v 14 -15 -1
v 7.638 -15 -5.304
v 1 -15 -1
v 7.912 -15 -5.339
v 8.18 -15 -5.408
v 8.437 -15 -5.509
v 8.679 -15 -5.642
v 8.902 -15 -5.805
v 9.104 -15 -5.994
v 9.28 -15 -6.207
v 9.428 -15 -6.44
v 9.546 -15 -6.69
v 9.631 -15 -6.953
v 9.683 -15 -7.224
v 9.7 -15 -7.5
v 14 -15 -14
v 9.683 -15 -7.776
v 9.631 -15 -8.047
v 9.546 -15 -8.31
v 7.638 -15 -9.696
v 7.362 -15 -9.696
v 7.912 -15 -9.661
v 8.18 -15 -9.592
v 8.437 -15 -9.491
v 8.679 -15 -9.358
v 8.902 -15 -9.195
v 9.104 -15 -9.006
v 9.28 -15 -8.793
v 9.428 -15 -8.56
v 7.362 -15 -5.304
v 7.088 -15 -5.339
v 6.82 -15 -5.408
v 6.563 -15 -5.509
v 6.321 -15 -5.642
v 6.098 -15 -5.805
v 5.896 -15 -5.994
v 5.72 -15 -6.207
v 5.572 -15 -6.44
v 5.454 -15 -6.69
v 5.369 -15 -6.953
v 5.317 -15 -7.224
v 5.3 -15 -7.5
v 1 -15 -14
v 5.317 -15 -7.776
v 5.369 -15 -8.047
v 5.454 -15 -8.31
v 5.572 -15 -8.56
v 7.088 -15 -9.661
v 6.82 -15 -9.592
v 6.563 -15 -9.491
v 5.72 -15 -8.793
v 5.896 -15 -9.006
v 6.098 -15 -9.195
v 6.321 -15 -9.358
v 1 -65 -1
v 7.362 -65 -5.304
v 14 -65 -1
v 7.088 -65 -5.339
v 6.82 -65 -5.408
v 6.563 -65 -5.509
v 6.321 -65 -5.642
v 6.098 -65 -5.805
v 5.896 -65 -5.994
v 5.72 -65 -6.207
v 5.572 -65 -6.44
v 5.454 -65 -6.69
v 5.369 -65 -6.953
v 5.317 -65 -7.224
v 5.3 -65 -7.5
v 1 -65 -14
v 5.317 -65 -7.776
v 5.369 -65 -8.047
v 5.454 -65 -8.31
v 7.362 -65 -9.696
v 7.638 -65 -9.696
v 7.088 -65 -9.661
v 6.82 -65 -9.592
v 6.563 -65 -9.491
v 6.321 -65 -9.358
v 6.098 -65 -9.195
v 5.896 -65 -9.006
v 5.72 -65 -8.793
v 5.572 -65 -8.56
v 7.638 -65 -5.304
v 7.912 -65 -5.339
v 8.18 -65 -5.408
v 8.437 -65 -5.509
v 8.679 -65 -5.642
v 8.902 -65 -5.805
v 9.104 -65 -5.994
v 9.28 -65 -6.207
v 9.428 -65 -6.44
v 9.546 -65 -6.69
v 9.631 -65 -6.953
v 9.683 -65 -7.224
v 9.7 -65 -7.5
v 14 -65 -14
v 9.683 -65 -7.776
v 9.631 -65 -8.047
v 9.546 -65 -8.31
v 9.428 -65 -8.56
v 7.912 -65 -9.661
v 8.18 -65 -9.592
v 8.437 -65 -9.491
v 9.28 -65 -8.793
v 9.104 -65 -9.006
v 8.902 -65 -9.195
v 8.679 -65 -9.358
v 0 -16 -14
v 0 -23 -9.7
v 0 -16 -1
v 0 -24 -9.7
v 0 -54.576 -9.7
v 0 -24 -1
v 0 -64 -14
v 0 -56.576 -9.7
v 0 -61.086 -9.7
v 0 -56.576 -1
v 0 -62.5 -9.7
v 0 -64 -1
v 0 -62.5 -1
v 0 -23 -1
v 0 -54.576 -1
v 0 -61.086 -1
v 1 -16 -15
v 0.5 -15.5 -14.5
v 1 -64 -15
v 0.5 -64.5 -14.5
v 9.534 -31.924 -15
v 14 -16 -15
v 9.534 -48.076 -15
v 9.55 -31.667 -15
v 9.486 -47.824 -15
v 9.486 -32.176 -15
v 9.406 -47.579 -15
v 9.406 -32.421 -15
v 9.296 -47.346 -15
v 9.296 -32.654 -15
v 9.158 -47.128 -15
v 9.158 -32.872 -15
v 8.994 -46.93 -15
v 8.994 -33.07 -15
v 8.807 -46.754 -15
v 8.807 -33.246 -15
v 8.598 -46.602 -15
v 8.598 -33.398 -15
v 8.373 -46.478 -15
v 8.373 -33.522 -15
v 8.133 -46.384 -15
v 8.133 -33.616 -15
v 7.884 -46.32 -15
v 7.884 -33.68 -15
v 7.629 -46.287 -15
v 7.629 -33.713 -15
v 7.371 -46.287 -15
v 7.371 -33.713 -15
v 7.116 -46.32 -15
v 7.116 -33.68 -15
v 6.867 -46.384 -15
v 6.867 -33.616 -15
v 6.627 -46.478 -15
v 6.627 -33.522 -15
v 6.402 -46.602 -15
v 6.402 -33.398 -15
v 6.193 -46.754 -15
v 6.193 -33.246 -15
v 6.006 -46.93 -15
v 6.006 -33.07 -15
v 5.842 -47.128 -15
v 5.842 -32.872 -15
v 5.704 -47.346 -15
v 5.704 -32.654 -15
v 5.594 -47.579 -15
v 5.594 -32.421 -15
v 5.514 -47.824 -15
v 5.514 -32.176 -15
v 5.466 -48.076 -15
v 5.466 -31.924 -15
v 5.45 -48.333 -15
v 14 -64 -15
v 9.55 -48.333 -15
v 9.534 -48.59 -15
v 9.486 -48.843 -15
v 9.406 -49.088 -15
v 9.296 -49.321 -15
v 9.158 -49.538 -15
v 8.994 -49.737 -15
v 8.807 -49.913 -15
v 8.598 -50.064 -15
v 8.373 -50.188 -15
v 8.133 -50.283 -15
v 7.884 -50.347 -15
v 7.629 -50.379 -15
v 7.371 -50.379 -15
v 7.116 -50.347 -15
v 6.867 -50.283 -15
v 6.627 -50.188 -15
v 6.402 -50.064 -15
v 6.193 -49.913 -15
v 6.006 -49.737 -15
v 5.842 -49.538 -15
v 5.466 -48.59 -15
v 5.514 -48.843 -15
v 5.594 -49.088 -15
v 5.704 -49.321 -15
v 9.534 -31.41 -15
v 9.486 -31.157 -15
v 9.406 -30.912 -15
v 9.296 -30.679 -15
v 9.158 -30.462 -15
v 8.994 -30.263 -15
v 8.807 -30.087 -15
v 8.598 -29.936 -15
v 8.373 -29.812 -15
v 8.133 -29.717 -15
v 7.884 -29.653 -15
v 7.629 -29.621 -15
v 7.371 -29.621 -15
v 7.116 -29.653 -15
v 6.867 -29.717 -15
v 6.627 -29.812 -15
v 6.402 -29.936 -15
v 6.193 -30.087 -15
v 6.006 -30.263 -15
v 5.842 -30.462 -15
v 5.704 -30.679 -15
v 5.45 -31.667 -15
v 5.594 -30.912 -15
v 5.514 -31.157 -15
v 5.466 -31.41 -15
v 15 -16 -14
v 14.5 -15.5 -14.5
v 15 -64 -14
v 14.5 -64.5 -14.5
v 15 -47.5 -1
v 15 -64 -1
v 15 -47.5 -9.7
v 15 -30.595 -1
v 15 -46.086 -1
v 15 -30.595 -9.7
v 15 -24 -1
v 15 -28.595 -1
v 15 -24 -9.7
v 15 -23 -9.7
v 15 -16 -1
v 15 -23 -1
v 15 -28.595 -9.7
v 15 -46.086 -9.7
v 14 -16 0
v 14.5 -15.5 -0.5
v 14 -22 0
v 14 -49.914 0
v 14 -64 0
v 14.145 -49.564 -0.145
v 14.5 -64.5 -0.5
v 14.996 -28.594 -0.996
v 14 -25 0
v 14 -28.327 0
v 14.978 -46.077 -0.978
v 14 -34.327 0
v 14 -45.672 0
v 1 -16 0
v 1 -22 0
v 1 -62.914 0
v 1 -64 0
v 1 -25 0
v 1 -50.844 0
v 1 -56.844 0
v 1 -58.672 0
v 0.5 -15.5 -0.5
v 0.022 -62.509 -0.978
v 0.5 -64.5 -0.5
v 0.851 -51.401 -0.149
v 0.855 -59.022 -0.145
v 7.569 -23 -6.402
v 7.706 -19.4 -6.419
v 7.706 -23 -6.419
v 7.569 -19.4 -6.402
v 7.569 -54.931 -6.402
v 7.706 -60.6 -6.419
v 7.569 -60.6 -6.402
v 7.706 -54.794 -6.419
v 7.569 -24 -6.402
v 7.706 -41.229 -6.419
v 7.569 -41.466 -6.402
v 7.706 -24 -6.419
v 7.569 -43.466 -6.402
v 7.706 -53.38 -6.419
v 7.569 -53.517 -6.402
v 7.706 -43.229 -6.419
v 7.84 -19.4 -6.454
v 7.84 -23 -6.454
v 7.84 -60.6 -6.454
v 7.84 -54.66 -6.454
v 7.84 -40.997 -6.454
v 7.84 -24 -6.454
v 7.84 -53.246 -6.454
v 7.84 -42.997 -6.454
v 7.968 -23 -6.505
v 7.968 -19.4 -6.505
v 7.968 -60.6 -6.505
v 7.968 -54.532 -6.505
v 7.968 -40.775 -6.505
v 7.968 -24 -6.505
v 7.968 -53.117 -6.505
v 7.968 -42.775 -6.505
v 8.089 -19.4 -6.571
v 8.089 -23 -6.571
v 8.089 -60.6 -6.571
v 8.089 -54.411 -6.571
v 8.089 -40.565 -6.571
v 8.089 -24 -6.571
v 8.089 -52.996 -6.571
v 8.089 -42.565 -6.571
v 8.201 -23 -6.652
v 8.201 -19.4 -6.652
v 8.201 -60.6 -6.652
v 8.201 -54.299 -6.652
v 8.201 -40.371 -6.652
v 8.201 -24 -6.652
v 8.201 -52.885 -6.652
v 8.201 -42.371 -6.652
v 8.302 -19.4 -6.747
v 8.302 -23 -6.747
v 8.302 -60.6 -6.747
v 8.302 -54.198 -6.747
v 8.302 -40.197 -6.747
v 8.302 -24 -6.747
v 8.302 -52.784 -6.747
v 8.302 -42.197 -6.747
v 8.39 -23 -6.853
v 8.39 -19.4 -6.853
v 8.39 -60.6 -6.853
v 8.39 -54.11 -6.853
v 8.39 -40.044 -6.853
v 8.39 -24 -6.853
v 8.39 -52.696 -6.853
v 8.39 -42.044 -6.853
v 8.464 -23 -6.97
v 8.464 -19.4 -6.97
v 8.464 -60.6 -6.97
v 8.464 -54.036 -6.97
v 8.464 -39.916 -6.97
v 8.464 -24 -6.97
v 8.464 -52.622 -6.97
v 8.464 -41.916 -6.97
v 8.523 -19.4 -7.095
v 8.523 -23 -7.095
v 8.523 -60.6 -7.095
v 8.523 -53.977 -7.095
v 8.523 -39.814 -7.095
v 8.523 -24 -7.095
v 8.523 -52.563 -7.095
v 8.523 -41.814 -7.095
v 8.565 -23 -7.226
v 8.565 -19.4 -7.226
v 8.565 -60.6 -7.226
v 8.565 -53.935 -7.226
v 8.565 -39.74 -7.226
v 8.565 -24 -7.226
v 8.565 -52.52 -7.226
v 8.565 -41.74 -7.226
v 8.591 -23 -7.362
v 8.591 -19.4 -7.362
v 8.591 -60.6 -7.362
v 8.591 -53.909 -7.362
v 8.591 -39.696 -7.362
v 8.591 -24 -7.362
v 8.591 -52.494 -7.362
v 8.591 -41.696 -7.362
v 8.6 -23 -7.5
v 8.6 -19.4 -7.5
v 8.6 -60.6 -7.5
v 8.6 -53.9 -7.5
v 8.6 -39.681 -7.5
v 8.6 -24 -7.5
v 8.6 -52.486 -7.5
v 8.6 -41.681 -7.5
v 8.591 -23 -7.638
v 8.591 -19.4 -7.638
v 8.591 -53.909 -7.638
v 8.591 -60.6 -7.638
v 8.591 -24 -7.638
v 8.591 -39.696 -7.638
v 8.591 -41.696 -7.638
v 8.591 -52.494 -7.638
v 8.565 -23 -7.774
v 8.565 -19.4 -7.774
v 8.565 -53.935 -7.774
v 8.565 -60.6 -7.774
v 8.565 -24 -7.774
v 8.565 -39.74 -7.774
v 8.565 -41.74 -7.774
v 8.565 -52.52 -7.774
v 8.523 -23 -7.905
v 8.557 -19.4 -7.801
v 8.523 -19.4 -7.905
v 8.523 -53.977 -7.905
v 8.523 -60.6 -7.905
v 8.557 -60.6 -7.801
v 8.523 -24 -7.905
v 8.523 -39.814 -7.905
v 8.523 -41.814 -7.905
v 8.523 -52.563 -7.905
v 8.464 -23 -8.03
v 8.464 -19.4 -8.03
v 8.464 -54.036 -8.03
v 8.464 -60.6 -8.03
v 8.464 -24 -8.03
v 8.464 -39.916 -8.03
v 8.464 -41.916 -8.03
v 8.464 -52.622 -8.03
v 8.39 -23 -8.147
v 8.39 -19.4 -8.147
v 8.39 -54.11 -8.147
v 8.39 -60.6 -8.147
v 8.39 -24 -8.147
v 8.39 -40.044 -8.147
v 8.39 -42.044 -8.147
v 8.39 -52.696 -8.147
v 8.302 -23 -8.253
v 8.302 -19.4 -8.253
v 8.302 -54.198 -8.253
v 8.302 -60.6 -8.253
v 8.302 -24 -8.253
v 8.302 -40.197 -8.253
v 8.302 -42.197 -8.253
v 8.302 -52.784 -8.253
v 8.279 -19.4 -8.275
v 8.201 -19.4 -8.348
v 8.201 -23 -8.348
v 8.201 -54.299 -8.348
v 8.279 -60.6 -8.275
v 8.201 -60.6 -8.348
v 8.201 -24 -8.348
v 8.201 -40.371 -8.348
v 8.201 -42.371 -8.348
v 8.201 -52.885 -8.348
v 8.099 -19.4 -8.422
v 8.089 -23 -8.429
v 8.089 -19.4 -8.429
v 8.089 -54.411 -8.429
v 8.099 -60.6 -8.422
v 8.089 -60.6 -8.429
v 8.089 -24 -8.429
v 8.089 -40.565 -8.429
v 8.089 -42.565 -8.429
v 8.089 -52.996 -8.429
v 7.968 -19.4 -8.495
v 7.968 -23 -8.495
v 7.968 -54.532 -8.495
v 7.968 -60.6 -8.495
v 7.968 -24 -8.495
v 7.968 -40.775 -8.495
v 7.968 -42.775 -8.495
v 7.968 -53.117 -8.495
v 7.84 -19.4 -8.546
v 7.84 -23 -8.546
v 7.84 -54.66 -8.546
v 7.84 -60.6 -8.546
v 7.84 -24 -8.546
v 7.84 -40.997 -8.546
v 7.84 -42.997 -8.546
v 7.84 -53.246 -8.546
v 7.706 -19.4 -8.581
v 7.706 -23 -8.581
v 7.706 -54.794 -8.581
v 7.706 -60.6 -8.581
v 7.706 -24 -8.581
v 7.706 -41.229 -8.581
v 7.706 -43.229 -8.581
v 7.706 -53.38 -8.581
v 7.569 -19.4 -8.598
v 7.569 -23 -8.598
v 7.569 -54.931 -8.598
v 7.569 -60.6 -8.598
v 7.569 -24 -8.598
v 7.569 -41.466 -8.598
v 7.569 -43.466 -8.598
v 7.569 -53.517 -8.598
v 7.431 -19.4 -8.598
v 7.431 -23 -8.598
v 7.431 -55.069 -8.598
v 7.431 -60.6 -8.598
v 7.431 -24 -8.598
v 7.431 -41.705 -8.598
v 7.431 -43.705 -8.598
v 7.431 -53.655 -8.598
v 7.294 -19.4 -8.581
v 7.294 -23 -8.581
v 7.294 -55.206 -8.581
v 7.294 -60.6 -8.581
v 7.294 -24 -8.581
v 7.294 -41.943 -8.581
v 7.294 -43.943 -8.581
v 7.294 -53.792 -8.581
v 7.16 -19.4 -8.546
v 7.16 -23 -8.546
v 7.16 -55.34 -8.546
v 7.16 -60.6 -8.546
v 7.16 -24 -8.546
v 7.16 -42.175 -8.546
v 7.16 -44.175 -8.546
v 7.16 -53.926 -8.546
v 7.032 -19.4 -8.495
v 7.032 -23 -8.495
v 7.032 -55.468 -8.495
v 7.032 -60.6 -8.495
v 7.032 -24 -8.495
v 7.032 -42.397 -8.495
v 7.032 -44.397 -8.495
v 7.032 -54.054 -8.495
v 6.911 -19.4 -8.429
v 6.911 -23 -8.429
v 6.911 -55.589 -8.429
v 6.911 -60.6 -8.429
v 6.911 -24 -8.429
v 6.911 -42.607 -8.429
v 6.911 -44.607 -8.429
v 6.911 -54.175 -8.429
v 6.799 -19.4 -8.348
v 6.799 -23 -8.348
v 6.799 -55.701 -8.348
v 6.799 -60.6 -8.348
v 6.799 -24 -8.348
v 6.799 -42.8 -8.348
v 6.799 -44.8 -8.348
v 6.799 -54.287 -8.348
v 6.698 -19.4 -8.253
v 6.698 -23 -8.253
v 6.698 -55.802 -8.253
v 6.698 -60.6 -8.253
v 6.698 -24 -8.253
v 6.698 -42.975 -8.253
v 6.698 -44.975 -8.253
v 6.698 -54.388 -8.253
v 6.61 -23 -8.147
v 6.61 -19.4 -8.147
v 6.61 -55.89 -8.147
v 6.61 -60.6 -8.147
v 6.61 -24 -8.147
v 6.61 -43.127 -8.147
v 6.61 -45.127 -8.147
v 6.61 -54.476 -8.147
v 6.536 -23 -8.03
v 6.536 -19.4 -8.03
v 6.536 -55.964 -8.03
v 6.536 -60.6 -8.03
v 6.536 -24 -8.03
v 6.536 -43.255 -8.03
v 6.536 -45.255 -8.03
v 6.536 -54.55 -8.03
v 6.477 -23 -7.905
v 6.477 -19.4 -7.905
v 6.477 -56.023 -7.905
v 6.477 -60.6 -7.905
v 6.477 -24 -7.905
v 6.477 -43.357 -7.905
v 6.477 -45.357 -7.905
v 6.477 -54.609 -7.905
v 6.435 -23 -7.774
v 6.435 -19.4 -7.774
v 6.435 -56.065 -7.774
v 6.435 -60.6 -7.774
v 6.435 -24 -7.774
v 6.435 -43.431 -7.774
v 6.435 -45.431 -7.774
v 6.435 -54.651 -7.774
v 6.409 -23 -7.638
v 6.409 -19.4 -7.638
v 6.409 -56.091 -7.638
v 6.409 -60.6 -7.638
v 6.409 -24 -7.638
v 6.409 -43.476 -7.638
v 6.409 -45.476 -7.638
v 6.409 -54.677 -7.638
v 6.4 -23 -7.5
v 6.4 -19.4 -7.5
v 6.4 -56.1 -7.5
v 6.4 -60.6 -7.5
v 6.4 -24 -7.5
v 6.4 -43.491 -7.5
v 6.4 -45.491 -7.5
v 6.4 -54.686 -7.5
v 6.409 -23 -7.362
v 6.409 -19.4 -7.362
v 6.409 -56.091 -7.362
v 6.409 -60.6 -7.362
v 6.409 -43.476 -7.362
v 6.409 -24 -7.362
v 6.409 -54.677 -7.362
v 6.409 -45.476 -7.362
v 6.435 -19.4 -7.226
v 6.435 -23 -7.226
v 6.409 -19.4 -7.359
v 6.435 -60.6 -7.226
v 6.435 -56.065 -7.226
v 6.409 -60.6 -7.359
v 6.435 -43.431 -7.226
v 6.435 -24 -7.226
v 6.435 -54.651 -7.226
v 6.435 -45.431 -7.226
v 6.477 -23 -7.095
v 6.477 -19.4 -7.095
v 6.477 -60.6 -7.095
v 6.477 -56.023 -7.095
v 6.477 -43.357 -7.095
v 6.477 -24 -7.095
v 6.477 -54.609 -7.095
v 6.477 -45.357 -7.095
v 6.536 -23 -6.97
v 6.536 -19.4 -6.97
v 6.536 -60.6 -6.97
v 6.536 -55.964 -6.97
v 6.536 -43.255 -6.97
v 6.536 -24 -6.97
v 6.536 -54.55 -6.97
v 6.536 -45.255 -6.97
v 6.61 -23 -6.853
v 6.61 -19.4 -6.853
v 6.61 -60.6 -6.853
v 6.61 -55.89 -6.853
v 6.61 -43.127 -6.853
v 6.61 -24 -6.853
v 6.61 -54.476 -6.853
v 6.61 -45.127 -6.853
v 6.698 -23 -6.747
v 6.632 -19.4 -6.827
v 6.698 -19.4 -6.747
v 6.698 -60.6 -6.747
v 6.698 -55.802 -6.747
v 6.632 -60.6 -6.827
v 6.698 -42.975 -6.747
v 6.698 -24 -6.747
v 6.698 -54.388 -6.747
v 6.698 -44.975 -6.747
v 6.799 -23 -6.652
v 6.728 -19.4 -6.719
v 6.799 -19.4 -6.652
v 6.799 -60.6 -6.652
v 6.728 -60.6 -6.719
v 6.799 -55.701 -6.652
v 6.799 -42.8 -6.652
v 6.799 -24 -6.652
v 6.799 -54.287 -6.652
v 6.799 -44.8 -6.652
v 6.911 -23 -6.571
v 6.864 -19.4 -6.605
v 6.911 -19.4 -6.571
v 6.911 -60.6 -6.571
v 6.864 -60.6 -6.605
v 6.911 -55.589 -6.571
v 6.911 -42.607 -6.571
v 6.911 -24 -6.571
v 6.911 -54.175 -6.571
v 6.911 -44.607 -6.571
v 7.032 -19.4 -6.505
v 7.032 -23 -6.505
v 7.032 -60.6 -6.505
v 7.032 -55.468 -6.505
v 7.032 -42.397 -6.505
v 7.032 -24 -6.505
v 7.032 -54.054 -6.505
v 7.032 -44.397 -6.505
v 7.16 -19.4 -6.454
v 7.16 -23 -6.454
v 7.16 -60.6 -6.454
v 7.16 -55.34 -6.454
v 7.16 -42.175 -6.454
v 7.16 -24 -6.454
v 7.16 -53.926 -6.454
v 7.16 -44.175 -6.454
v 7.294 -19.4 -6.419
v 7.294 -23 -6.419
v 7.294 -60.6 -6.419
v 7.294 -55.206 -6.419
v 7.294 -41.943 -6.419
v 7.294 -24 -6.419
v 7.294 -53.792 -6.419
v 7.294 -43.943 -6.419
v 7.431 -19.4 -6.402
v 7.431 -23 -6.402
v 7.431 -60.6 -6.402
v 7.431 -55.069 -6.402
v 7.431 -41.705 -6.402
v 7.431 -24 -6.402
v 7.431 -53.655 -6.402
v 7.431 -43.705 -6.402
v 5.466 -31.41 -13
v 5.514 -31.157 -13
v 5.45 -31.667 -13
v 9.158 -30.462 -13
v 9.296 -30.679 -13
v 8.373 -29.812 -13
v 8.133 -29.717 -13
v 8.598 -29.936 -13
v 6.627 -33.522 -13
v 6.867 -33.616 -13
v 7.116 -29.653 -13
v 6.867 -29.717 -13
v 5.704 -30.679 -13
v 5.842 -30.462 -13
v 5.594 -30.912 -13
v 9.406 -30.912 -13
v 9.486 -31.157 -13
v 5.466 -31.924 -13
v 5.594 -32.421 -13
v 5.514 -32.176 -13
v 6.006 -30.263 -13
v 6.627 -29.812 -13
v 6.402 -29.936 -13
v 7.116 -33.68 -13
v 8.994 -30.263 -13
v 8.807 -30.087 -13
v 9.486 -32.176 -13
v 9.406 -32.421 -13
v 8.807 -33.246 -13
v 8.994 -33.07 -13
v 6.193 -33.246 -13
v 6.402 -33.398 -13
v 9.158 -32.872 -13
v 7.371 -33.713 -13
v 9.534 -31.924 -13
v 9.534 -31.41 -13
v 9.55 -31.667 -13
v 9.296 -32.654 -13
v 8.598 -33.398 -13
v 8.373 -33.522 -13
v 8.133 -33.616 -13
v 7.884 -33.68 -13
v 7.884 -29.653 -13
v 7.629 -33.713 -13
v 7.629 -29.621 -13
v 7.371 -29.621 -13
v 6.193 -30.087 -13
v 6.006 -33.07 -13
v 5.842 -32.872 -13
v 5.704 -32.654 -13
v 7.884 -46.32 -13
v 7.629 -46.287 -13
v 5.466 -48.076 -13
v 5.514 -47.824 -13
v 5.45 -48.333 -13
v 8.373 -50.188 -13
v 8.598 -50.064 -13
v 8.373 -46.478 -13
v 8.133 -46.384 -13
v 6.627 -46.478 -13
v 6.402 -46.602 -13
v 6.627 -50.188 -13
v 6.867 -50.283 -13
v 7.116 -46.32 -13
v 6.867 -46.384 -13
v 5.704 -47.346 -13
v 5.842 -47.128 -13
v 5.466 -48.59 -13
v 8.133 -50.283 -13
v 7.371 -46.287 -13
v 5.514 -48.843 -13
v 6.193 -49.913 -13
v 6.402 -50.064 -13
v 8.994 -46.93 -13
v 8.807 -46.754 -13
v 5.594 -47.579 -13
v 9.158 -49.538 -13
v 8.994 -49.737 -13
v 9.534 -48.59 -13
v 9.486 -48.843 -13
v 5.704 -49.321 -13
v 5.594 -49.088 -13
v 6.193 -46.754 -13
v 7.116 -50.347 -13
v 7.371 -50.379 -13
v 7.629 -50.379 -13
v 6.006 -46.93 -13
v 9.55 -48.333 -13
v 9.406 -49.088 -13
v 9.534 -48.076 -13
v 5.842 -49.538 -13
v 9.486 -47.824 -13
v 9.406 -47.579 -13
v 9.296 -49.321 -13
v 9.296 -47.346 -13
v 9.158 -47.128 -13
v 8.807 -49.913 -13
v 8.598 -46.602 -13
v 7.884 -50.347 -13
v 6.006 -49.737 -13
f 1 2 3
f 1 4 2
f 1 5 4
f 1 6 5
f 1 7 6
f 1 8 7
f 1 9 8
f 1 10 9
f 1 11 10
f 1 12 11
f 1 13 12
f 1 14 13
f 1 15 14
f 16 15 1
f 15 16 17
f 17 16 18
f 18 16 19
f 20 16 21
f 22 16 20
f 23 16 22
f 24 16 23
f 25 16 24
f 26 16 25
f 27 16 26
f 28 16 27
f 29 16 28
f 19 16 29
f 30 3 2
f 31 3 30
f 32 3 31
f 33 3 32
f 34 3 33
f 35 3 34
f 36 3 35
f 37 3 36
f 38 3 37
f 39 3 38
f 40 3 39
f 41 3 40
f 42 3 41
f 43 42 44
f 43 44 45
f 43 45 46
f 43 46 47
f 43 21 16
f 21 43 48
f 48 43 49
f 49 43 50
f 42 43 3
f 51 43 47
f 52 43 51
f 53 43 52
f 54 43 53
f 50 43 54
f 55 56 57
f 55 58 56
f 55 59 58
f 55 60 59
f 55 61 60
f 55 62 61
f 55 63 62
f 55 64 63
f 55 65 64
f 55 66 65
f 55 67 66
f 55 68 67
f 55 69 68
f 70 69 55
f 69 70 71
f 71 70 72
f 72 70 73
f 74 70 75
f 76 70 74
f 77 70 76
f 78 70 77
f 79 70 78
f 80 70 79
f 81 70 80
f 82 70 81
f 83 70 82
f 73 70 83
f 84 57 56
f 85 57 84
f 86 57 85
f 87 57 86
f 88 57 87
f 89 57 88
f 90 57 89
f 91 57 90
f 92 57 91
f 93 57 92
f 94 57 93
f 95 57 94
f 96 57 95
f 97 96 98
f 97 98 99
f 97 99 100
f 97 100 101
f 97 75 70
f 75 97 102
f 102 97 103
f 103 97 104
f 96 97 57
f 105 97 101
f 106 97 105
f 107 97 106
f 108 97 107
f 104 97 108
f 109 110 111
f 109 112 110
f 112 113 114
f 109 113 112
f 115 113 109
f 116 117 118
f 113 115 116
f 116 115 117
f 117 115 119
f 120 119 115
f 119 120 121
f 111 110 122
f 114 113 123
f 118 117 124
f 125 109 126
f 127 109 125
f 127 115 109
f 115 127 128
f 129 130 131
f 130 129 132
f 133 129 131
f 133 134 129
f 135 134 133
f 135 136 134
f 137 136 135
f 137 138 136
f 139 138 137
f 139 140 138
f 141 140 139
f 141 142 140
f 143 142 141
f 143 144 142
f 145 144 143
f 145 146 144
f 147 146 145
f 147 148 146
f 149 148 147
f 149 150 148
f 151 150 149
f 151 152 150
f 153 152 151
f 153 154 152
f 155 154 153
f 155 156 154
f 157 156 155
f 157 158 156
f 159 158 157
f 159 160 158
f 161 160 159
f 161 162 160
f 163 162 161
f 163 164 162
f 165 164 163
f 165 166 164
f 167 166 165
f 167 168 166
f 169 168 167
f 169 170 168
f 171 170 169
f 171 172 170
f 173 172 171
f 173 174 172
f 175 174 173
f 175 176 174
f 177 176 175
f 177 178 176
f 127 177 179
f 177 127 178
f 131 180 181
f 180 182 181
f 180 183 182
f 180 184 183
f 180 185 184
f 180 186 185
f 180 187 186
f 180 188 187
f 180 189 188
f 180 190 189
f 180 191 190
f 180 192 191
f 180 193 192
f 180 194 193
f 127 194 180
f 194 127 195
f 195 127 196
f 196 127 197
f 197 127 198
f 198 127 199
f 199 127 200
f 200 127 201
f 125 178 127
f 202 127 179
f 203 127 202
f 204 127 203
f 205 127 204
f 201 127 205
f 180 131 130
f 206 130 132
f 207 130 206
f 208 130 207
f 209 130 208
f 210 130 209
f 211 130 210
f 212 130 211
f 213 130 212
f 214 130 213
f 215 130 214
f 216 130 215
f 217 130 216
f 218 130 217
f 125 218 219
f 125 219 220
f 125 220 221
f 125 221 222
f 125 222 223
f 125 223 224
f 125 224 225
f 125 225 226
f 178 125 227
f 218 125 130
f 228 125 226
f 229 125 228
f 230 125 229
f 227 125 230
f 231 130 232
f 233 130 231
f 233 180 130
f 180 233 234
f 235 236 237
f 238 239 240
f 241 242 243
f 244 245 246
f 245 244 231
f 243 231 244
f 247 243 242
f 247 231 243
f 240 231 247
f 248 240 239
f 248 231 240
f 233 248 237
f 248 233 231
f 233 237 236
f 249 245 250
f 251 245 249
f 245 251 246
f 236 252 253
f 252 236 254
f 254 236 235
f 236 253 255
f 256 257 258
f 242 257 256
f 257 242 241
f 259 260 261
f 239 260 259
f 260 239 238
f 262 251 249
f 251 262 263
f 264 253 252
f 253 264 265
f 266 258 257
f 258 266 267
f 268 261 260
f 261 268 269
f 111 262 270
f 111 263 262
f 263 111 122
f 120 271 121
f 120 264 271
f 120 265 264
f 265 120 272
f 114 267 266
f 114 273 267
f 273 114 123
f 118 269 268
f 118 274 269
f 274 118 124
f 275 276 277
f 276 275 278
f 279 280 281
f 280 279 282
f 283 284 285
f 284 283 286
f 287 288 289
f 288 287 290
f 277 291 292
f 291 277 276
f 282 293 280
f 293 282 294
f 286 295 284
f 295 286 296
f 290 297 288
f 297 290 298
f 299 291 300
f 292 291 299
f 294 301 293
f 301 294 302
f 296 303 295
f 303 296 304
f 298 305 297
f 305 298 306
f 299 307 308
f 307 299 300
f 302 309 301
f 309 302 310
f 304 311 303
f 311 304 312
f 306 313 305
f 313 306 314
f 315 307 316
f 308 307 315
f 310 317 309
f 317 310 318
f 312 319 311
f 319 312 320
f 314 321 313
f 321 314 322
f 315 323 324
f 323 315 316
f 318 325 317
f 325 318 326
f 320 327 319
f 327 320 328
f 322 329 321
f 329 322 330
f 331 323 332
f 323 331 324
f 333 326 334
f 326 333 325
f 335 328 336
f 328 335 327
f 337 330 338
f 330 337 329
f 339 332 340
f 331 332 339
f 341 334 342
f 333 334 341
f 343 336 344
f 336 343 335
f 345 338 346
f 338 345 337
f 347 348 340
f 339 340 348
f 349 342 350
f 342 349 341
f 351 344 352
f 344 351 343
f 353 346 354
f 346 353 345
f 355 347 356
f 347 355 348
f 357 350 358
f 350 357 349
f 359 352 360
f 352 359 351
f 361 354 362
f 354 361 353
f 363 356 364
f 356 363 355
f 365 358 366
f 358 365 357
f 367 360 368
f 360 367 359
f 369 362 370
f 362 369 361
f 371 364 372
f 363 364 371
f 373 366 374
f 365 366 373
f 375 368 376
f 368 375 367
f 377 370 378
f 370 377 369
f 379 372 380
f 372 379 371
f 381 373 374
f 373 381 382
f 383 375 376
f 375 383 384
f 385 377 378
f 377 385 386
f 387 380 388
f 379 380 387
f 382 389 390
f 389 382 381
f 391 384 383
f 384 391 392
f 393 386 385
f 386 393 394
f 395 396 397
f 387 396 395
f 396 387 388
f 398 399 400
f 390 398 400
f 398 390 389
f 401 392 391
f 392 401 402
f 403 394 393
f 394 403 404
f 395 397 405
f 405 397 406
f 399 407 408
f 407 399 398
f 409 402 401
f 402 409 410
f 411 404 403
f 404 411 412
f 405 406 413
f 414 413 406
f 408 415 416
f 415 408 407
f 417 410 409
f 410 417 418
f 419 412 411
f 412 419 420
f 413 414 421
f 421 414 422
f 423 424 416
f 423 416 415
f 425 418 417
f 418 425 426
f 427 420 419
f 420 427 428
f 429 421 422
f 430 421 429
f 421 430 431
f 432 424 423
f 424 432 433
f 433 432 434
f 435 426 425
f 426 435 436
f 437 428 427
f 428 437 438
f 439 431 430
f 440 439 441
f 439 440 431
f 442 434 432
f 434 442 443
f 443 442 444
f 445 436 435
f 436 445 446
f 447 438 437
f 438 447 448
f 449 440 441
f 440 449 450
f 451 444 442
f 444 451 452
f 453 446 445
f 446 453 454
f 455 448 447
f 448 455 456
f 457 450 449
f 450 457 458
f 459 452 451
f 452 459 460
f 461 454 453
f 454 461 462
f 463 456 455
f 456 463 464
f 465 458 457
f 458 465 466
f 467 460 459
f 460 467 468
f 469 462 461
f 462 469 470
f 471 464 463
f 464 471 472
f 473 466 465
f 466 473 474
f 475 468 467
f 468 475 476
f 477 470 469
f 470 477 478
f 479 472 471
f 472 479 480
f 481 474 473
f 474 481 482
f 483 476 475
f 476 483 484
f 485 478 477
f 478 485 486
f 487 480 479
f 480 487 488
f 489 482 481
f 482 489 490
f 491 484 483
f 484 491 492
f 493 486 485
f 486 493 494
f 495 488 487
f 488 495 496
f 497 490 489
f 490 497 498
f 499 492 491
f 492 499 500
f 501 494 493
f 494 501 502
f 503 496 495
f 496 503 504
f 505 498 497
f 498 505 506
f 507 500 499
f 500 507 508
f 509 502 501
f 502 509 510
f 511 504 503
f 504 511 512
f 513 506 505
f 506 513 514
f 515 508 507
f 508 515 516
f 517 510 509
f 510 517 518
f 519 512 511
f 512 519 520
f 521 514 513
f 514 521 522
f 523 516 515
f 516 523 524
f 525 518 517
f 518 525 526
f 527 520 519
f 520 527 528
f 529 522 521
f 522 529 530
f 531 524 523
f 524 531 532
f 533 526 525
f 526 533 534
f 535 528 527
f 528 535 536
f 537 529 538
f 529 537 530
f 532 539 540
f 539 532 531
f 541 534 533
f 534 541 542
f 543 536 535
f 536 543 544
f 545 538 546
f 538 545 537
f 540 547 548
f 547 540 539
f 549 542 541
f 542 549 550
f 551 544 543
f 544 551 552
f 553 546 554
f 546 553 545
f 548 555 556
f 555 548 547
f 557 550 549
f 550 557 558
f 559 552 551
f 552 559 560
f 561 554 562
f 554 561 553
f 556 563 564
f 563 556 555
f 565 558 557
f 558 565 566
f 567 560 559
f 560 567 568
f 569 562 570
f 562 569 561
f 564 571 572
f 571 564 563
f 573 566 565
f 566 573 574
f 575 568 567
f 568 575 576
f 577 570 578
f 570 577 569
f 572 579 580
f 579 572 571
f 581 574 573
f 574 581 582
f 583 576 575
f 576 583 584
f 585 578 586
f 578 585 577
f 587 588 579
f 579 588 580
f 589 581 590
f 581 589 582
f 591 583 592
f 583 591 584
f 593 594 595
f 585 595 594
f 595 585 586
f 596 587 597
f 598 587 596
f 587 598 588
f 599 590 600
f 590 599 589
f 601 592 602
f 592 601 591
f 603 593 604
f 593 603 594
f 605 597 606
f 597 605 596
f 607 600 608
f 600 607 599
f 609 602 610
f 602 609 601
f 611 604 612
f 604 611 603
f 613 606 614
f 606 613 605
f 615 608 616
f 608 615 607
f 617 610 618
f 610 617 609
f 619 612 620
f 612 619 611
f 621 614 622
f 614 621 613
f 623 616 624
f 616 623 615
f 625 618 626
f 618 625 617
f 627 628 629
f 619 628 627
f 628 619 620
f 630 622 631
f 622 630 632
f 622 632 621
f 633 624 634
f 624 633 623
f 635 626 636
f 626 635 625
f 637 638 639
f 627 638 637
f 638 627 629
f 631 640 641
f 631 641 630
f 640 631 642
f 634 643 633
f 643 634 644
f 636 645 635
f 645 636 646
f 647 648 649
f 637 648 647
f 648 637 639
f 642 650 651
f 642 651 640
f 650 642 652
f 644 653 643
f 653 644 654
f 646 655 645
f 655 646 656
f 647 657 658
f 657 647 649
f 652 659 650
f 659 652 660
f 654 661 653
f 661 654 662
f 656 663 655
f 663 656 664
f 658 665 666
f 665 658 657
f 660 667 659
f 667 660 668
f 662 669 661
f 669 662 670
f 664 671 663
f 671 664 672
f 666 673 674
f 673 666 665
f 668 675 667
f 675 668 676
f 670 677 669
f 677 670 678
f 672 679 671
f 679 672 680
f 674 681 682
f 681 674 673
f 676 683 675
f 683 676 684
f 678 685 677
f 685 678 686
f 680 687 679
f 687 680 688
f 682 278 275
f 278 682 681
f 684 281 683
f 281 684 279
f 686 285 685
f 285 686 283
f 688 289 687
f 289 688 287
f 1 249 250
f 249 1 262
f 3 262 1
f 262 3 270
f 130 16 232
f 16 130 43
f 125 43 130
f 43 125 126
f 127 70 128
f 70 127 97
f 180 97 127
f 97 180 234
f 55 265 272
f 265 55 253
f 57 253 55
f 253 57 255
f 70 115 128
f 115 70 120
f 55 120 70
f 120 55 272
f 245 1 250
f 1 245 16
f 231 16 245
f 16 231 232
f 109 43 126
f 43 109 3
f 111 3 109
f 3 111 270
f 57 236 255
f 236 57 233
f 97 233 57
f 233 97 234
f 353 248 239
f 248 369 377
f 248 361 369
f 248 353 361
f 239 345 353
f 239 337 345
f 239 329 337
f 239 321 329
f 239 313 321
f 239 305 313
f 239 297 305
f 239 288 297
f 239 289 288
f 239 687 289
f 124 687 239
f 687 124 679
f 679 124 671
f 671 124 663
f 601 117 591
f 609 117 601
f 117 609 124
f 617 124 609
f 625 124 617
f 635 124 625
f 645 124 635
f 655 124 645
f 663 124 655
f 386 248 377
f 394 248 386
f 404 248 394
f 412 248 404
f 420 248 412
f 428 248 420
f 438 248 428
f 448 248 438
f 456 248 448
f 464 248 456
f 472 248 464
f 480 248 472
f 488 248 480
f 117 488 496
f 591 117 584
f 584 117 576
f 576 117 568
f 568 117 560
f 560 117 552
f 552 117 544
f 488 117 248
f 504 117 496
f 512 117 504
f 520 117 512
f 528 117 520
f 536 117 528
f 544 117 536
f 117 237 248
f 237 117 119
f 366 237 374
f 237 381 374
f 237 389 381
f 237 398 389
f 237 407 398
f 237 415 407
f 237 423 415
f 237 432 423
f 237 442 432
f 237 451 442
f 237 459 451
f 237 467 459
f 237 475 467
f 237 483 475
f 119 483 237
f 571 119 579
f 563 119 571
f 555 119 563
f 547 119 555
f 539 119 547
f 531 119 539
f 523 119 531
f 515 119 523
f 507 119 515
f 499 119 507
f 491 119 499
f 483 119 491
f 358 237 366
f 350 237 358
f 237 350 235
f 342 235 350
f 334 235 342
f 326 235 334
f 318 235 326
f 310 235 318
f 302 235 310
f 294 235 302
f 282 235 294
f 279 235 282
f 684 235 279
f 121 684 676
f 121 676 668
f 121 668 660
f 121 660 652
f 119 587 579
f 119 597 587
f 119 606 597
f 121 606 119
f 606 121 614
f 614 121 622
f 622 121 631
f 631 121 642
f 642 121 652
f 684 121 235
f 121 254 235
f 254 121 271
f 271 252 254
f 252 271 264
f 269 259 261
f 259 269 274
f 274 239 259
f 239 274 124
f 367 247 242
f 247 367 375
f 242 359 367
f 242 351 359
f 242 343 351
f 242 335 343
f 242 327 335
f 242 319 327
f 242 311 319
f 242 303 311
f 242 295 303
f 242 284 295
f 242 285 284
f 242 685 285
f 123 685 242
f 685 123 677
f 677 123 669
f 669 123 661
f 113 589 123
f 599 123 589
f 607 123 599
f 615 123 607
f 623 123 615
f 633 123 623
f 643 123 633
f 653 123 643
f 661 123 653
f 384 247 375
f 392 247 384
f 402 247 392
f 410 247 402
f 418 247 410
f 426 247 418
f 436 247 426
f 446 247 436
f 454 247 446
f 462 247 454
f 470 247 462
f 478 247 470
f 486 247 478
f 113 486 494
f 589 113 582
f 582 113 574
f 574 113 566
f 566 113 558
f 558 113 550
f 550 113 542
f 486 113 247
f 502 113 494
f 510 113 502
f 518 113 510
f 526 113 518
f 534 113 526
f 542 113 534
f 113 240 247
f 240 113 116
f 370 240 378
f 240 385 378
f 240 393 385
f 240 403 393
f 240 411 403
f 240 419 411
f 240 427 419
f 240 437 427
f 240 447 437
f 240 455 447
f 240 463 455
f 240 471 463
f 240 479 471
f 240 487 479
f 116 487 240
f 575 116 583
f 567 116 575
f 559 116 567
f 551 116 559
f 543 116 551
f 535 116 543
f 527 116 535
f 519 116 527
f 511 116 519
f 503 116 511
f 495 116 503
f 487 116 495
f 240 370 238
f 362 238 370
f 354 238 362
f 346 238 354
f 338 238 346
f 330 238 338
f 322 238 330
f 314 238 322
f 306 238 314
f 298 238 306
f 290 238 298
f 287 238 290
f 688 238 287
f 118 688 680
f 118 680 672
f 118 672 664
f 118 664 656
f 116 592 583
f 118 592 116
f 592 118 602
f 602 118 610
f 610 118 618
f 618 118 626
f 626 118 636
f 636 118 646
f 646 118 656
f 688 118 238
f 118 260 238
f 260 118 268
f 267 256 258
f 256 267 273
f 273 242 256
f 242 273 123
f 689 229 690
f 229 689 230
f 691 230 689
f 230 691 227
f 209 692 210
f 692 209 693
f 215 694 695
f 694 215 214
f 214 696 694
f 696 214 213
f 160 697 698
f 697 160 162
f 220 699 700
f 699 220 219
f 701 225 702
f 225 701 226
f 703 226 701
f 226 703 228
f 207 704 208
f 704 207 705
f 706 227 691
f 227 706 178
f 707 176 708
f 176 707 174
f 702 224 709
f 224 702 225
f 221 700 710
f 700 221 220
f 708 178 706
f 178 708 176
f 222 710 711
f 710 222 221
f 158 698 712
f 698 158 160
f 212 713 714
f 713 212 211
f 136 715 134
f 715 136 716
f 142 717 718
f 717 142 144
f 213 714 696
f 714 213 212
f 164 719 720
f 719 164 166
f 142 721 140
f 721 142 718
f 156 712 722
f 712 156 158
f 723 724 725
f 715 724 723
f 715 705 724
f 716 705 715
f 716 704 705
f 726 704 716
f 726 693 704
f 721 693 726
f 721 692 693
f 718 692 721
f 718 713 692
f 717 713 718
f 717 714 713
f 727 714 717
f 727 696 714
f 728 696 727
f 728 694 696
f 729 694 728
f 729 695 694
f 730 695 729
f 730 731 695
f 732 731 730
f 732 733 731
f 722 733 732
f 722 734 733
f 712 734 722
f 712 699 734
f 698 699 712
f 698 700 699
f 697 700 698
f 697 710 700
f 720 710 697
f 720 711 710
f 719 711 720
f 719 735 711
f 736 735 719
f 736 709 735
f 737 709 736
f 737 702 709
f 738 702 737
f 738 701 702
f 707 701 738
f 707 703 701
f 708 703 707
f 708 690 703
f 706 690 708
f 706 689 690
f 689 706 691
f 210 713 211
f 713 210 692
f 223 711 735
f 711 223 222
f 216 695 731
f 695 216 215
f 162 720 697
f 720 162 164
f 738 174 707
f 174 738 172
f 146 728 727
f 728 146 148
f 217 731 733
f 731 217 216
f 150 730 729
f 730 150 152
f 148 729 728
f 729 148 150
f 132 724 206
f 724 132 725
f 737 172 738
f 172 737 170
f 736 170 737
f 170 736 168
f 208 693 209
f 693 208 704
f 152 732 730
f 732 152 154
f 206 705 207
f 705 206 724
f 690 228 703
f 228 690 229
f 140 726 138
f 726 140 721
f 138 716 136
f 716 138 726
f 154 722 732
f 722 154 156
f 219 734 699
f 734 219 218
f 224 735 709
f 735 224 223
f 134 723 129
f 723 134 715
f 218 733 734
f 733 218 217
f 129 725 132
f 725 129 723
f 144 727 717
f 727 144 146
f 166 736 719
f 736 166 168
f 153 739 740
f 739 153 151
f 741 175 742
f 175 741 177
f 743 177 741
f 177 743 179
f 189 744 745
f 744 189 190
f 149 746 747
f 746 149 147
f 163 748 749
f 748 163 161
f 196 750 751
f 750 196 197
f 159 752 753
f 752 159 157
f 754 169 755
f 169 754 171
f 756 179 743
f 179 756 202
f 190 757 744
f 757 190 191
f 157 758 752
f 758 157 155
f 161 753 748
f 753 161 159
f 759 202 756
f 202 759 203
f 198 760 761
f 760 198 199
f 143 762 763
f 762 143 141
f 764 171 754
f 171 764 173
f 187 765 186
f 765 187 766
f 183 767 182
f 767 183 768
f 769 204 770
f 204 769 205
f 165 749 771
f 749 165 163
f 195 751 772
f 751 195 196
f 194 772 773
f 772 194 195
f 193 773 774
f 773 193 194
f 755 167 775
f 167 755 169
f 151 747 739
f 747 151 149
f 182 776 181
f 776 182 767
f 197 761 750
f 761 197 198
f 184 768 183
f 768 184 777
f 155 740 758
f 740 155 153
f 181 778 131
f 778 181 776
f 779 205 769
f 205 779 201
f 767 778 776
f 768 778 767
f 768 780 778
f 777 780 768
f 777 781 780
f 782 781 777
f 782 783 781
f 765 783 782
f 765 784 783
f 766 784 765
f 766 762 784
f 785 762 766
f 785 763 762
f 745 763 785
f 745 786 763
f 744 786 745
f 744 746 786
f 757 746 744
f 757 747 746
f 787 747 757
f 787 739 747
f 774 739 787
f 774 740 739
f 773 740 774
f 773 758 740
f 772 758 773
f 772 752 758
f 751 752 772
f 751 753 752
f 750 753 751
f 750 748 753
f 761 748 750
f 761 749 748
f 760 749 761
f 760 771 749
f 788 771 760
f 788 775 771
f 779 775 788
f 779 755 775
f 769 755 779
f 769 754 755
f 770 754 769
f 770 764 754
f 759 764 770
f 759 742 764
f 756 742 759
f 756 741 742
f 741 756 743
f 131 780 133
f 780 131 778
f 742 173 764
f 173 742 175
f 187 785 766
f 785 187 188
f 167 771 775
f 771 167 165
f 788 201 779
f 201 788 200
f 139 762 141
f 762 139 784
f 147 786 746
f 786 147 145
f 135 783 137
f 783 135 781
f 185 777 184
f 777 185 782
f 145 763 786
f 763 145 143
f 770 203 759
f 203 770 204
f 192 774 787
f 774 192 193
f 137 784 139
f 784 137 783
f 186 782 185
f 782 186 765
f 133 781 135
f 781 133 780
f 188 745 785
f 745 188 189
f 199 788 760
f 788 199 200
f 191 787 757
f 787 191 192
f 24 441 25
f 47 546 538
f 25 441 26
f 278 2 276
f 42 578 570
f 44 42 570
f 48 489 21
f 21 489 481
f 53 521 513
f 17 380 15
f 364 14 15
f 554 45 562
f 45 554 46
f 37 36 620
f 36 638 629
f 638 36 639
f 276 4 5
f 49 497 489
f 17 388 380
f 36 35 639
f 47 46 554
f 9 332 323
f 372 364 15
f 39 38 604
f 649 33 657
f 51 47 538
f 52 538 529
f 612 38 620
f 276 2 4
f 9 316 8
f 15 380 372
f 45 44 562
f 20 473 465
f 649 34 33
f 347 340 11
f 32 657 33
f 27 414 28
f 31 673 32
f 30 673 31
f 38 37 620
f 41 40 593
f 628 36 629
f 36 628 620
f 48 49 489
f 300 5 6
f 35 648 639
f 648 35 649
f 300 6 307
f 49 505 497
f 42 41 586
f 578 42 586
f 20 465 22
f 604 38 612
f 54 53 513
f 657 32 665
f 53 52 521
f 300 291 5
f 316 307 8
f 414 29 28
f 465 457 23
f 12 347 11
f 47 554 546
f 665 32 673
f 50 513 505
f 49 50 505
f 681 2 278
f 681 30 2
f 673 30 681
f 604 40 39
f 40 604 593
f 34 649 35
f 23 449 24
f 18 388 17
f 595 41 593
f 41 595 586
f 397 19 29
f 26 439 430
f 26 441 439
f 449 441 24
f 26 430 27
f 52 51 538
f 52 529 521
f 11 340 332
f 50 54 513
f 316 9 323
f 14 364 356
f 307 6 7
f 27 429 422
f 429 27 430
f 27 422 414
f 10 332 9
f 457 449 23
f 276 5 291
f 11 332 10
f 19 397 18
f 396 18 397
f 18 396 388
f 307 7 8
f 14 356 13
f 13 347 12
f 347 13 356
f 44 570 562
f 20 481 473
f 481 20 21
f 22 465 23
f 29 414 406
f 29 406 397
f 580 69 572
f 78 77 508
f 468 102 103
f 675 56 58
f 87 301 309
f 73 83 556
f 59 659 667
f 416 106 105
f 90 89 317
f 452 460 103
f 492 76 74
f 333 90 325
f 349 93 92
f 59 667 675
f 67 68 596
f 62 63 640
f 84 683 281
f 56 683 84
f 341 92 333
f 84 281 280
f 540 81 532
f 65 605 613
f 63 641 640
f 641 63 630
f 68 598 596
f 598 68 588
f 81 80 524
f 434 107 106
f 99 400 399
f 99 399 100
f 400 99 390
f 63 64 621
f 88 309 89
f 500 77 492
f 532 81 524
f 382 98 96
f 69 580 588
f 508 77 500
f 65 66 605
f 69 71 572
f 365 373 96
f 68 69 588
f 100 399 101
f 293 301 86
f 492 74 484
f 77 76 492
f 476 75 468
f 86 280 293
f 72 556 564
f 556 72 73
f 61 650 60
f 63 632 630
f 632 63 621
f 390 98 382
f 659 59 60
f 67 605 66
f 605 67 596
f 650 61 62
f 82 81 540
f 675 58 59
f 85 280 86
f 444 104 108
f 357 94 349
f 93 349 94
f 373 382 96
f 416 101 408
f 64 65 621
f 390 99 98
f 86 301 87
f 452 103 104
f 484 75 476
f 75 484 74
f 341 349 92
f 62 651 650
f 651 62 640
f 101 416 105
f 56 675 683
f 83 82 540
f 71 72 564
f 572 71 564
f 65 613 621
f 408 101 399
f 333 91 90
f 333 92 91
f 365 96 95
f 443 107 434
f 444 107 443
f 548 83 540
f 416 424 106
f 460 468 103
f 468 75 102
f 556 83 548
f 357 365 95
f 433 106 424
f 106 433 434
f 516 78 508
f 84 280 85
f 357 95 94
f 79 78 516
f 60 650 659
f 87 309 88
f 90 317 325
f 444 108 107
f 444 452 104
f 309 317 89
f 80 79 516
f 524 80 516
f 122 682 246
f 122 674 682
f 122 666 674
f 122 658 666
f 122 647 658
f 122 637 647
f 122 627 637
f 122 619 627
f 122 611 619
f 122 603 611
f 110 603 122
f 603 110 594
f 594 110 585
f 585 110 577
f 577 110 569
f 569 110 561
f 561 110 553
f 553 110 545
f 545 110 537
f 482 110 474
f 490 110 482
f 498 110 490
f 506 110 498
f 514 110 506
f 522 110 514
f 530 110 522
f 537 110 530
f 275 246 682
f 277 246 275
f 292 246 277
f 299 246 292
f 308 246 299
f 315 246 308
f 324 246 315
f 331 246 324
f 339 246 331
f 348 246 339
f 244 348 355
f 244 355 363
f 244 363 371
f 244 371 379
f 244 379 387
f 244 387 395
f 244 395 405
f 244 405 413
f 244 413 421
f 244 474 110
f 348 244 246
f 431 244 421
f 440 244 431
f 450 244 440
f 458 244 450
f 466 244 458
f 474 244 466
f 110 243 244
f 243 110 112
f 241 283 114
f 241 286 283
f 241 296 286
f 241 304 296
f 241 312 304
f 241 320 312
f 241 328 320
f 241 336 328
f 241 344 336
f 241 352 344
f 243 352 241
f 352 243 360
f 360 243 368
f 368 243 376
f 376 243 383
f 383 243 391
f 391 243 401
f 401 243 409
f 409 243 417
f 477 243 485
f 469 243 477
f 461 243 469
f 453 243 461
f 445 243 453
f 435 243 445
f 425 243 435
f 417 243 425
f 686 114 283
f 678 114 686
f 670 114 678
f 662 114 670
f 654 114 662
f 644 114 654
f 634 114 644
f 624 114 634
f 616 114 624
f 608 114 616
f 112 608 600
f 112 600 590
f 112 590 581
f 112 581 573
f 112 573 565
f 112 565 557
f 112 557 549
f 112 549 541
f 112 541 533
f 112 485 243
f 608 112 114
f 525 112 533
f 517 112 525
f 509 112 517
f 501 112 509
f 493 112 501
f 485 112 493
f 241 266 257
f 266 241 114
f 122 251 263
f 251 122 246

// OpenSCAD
// CHANGELOG (newest first; parsed by scripts/build-stl.mjs – format: "// <version> - <summary>", indented lines continue the entry)
// 1.0.0 - Initial versioned release: filament cutting holder with 90° and angled cutter slots, chamfered edges and magnet holes
//

/* [ Dimensions ] */
width = 15;
height = 15;
length = 50;

/* [ Corners ] */
corner_size = 1;

/* [ Filament width ] */
filament_width = 2.2;

/* [ Cutter thickness ] */
cutter_thickness = 1;

/* [ Cutter slot lead-in ] */
// size of the 45° lead-in chamfer at the slot opening (0 = none)
slot_chamfer = 1;

/* [ Angles ] */
// slot angles relative to the 90-degree slot (90 = identical to it), first one is nearest to the far end
angles = [45, 30];
// distance of the first angled slot from the end of the block
angled_slot_offset = 10;
// gap between neighbouring angled slots (measured along the filament axis)
angled_slot_gap = 10;

/* [ Magnets ] */
// number of magnet holes in the bottom face (1 = centered, 2 = thirds, ...)
magnet_count = 2;
magnet_diameter = 4;
// depth of the holes
magnet_depth = 2;
// extra diameter for fit
magnet_clearance = 0.1;

/* [ Circle resolution ] */
$fn = 50;

/* [Hidden] */
// List of parts of this model – each item = one STL file. Every name needs a branch in render_part().
parts = ["holder"];
// Which part to render: "all" = preview, otherwise a name from `parts` (set by the build script via -D).
part = "all";
preview_part = "all"; // part rendered for the preview image (see scripts/build-stl.mjs)
preview_camera = [50, 0, 20]; // camera rotation (x, y, z) of the preview image (see scripts/build-stl.mjs)
preview_color_1 = "#e67e22"; // preview colours only (STL has no colour)
model_version = "1.0.0";

// rectangle w x h with all four corners chamfered by c
module chamfered_rect(w, h, c) {
    polygon(points = [
        [c, 0], [w - c, 0], [w, c], [w, h - c],
        [w - c, h], [c, h], [0, h - c], [0, c]
    ]);
}

// width of angled slot i measured along the filament axis
function angled_slot_w(i) = cutter_thickness / sin(angles[i]);

// z (along the length) of the lower-z edge of angled slot i on the filament axis.
// The first slot ends angled_slot_offset before the far end, the others follow
// towards the middle of the block with angled_slot_gap between them.
function angled_slot_z(i) = i == 0
    ? length - angled_slot_offset - angled_slot_w(0)
    : angled_slot_z(i - 1) - angled_slot_gap - angled_slot_w(i);

// straight vertical cutter slot centered on the origin (thickness along z, running along x,
// depth along y from the top face) with lead-in chamfers
module slot_cut(len) {
    t = cutter_thickness;
    depth = height/2 + filament_width;
    c = slot_chamfer;
    e = 0.01;
    rotate([90, 0, 90]) linear_extrude(height = len, center = true) {
        polygon(points = [
            [-e,    -t/2 - c - e],
            [c,     -t/2],
            [depth, -t/2],
            [depth,  t/2],
            [c,      t/2],
            [-e,     t/2 + c + e]
        ]);
    }
}

// the 90-degree slot turned around the vertical axis so that it meets the filament axis at
// angle a (a = 90 gives exactly the 90-degree slot); zs = z of its lower-z edge on the
// filament axis. The slot leans towards z = length with growing x.
module angled_slot(a, zs) {
    w = cutter_thickness / sin(a);
    translate([width/2, 0, zs + w/2]) rotate([0, a - 90, 0]) slot_cut(width / sin(a) + 2);
}

// Print orientation: flipped so that the magnet holes face up, flat on Z=0
module holder() {
    translate([0, -height, height]) rotate([90, 0, 0]) difference() {
        // basic shape of the holder: long edges chamfered by the profile itself,
        // the edges around both end faces by intersecting with two more chamfered prisms
        intersection() {
            linear_extrude(height = length) {
                difference() {
                    // square with chamfered corners
                    chamfered_rect(width, height, corner_size);
                    // filament hole centered in the square
                    translate([width/2, height/2]) circle(d = filament_width);
                }
            };
            // end edges running along x
            rotate([90, 0, 90]) linear_extrude(height = width) chamfered_rect(height, length, corner_size);
            // end edges running along y
            translate([0, height, 0]) rotate([90, 0, 0]) linear_extrude(height = height) chamfered_rect(width, length, corner_size);
        }
        // filament cylinders at both ends
        translate([width/2, height/2, 0]) {
            cylinder(h = filament_width*2, r1 = filament_width, r2 = filament_width/2);
        }
        translate([width/2, height/2, length - filament_width*2]) {
            cylinder(h = filament_width*2, r2 = filament_width, r1 = filament_width/2);
        }

        // 90-degree cutter slot
        angled_slot(90, 8);

        // angled cutter slots on the same side, near the far end, in the order of `angles`
        for (i = [0 : len(angles) - 1]) {
            angled_slot(angles[i], angled_slot_z(i));
        }

        // magnet holes in the bottom face (local y = height), evenly spread along the length
        if (magnet_count > 0) {
            for (i = [1 : magnet_count]) {
                translate([width/2, height - magnet_depth, length * i / (magnet_count + 1)])
                    rotate([-90, 0, 0])
                        cylinder(d = magnet_diameter + magnet_clearance, h = magnet_depth + 0.01);
            }
        }
    }
}

module render_part(p) {
    if (p == "holder") holder();
    else assert(false, str("Unknown part: ", p));
}

if (part == "all") {
    // Preview: all parts
    // (preview only: turned over around the long axis so that the cutter slots face up; printed they face the bed;
    // render() because the preview shows a white line along the through hole of the filament without it)
    color(preview_color_1) translate([width, 0, height]) rotate([0, 180, 0]) render(convexity = 10) for (p = parts) render_part(p);
} else {
    render_part(part);
}
